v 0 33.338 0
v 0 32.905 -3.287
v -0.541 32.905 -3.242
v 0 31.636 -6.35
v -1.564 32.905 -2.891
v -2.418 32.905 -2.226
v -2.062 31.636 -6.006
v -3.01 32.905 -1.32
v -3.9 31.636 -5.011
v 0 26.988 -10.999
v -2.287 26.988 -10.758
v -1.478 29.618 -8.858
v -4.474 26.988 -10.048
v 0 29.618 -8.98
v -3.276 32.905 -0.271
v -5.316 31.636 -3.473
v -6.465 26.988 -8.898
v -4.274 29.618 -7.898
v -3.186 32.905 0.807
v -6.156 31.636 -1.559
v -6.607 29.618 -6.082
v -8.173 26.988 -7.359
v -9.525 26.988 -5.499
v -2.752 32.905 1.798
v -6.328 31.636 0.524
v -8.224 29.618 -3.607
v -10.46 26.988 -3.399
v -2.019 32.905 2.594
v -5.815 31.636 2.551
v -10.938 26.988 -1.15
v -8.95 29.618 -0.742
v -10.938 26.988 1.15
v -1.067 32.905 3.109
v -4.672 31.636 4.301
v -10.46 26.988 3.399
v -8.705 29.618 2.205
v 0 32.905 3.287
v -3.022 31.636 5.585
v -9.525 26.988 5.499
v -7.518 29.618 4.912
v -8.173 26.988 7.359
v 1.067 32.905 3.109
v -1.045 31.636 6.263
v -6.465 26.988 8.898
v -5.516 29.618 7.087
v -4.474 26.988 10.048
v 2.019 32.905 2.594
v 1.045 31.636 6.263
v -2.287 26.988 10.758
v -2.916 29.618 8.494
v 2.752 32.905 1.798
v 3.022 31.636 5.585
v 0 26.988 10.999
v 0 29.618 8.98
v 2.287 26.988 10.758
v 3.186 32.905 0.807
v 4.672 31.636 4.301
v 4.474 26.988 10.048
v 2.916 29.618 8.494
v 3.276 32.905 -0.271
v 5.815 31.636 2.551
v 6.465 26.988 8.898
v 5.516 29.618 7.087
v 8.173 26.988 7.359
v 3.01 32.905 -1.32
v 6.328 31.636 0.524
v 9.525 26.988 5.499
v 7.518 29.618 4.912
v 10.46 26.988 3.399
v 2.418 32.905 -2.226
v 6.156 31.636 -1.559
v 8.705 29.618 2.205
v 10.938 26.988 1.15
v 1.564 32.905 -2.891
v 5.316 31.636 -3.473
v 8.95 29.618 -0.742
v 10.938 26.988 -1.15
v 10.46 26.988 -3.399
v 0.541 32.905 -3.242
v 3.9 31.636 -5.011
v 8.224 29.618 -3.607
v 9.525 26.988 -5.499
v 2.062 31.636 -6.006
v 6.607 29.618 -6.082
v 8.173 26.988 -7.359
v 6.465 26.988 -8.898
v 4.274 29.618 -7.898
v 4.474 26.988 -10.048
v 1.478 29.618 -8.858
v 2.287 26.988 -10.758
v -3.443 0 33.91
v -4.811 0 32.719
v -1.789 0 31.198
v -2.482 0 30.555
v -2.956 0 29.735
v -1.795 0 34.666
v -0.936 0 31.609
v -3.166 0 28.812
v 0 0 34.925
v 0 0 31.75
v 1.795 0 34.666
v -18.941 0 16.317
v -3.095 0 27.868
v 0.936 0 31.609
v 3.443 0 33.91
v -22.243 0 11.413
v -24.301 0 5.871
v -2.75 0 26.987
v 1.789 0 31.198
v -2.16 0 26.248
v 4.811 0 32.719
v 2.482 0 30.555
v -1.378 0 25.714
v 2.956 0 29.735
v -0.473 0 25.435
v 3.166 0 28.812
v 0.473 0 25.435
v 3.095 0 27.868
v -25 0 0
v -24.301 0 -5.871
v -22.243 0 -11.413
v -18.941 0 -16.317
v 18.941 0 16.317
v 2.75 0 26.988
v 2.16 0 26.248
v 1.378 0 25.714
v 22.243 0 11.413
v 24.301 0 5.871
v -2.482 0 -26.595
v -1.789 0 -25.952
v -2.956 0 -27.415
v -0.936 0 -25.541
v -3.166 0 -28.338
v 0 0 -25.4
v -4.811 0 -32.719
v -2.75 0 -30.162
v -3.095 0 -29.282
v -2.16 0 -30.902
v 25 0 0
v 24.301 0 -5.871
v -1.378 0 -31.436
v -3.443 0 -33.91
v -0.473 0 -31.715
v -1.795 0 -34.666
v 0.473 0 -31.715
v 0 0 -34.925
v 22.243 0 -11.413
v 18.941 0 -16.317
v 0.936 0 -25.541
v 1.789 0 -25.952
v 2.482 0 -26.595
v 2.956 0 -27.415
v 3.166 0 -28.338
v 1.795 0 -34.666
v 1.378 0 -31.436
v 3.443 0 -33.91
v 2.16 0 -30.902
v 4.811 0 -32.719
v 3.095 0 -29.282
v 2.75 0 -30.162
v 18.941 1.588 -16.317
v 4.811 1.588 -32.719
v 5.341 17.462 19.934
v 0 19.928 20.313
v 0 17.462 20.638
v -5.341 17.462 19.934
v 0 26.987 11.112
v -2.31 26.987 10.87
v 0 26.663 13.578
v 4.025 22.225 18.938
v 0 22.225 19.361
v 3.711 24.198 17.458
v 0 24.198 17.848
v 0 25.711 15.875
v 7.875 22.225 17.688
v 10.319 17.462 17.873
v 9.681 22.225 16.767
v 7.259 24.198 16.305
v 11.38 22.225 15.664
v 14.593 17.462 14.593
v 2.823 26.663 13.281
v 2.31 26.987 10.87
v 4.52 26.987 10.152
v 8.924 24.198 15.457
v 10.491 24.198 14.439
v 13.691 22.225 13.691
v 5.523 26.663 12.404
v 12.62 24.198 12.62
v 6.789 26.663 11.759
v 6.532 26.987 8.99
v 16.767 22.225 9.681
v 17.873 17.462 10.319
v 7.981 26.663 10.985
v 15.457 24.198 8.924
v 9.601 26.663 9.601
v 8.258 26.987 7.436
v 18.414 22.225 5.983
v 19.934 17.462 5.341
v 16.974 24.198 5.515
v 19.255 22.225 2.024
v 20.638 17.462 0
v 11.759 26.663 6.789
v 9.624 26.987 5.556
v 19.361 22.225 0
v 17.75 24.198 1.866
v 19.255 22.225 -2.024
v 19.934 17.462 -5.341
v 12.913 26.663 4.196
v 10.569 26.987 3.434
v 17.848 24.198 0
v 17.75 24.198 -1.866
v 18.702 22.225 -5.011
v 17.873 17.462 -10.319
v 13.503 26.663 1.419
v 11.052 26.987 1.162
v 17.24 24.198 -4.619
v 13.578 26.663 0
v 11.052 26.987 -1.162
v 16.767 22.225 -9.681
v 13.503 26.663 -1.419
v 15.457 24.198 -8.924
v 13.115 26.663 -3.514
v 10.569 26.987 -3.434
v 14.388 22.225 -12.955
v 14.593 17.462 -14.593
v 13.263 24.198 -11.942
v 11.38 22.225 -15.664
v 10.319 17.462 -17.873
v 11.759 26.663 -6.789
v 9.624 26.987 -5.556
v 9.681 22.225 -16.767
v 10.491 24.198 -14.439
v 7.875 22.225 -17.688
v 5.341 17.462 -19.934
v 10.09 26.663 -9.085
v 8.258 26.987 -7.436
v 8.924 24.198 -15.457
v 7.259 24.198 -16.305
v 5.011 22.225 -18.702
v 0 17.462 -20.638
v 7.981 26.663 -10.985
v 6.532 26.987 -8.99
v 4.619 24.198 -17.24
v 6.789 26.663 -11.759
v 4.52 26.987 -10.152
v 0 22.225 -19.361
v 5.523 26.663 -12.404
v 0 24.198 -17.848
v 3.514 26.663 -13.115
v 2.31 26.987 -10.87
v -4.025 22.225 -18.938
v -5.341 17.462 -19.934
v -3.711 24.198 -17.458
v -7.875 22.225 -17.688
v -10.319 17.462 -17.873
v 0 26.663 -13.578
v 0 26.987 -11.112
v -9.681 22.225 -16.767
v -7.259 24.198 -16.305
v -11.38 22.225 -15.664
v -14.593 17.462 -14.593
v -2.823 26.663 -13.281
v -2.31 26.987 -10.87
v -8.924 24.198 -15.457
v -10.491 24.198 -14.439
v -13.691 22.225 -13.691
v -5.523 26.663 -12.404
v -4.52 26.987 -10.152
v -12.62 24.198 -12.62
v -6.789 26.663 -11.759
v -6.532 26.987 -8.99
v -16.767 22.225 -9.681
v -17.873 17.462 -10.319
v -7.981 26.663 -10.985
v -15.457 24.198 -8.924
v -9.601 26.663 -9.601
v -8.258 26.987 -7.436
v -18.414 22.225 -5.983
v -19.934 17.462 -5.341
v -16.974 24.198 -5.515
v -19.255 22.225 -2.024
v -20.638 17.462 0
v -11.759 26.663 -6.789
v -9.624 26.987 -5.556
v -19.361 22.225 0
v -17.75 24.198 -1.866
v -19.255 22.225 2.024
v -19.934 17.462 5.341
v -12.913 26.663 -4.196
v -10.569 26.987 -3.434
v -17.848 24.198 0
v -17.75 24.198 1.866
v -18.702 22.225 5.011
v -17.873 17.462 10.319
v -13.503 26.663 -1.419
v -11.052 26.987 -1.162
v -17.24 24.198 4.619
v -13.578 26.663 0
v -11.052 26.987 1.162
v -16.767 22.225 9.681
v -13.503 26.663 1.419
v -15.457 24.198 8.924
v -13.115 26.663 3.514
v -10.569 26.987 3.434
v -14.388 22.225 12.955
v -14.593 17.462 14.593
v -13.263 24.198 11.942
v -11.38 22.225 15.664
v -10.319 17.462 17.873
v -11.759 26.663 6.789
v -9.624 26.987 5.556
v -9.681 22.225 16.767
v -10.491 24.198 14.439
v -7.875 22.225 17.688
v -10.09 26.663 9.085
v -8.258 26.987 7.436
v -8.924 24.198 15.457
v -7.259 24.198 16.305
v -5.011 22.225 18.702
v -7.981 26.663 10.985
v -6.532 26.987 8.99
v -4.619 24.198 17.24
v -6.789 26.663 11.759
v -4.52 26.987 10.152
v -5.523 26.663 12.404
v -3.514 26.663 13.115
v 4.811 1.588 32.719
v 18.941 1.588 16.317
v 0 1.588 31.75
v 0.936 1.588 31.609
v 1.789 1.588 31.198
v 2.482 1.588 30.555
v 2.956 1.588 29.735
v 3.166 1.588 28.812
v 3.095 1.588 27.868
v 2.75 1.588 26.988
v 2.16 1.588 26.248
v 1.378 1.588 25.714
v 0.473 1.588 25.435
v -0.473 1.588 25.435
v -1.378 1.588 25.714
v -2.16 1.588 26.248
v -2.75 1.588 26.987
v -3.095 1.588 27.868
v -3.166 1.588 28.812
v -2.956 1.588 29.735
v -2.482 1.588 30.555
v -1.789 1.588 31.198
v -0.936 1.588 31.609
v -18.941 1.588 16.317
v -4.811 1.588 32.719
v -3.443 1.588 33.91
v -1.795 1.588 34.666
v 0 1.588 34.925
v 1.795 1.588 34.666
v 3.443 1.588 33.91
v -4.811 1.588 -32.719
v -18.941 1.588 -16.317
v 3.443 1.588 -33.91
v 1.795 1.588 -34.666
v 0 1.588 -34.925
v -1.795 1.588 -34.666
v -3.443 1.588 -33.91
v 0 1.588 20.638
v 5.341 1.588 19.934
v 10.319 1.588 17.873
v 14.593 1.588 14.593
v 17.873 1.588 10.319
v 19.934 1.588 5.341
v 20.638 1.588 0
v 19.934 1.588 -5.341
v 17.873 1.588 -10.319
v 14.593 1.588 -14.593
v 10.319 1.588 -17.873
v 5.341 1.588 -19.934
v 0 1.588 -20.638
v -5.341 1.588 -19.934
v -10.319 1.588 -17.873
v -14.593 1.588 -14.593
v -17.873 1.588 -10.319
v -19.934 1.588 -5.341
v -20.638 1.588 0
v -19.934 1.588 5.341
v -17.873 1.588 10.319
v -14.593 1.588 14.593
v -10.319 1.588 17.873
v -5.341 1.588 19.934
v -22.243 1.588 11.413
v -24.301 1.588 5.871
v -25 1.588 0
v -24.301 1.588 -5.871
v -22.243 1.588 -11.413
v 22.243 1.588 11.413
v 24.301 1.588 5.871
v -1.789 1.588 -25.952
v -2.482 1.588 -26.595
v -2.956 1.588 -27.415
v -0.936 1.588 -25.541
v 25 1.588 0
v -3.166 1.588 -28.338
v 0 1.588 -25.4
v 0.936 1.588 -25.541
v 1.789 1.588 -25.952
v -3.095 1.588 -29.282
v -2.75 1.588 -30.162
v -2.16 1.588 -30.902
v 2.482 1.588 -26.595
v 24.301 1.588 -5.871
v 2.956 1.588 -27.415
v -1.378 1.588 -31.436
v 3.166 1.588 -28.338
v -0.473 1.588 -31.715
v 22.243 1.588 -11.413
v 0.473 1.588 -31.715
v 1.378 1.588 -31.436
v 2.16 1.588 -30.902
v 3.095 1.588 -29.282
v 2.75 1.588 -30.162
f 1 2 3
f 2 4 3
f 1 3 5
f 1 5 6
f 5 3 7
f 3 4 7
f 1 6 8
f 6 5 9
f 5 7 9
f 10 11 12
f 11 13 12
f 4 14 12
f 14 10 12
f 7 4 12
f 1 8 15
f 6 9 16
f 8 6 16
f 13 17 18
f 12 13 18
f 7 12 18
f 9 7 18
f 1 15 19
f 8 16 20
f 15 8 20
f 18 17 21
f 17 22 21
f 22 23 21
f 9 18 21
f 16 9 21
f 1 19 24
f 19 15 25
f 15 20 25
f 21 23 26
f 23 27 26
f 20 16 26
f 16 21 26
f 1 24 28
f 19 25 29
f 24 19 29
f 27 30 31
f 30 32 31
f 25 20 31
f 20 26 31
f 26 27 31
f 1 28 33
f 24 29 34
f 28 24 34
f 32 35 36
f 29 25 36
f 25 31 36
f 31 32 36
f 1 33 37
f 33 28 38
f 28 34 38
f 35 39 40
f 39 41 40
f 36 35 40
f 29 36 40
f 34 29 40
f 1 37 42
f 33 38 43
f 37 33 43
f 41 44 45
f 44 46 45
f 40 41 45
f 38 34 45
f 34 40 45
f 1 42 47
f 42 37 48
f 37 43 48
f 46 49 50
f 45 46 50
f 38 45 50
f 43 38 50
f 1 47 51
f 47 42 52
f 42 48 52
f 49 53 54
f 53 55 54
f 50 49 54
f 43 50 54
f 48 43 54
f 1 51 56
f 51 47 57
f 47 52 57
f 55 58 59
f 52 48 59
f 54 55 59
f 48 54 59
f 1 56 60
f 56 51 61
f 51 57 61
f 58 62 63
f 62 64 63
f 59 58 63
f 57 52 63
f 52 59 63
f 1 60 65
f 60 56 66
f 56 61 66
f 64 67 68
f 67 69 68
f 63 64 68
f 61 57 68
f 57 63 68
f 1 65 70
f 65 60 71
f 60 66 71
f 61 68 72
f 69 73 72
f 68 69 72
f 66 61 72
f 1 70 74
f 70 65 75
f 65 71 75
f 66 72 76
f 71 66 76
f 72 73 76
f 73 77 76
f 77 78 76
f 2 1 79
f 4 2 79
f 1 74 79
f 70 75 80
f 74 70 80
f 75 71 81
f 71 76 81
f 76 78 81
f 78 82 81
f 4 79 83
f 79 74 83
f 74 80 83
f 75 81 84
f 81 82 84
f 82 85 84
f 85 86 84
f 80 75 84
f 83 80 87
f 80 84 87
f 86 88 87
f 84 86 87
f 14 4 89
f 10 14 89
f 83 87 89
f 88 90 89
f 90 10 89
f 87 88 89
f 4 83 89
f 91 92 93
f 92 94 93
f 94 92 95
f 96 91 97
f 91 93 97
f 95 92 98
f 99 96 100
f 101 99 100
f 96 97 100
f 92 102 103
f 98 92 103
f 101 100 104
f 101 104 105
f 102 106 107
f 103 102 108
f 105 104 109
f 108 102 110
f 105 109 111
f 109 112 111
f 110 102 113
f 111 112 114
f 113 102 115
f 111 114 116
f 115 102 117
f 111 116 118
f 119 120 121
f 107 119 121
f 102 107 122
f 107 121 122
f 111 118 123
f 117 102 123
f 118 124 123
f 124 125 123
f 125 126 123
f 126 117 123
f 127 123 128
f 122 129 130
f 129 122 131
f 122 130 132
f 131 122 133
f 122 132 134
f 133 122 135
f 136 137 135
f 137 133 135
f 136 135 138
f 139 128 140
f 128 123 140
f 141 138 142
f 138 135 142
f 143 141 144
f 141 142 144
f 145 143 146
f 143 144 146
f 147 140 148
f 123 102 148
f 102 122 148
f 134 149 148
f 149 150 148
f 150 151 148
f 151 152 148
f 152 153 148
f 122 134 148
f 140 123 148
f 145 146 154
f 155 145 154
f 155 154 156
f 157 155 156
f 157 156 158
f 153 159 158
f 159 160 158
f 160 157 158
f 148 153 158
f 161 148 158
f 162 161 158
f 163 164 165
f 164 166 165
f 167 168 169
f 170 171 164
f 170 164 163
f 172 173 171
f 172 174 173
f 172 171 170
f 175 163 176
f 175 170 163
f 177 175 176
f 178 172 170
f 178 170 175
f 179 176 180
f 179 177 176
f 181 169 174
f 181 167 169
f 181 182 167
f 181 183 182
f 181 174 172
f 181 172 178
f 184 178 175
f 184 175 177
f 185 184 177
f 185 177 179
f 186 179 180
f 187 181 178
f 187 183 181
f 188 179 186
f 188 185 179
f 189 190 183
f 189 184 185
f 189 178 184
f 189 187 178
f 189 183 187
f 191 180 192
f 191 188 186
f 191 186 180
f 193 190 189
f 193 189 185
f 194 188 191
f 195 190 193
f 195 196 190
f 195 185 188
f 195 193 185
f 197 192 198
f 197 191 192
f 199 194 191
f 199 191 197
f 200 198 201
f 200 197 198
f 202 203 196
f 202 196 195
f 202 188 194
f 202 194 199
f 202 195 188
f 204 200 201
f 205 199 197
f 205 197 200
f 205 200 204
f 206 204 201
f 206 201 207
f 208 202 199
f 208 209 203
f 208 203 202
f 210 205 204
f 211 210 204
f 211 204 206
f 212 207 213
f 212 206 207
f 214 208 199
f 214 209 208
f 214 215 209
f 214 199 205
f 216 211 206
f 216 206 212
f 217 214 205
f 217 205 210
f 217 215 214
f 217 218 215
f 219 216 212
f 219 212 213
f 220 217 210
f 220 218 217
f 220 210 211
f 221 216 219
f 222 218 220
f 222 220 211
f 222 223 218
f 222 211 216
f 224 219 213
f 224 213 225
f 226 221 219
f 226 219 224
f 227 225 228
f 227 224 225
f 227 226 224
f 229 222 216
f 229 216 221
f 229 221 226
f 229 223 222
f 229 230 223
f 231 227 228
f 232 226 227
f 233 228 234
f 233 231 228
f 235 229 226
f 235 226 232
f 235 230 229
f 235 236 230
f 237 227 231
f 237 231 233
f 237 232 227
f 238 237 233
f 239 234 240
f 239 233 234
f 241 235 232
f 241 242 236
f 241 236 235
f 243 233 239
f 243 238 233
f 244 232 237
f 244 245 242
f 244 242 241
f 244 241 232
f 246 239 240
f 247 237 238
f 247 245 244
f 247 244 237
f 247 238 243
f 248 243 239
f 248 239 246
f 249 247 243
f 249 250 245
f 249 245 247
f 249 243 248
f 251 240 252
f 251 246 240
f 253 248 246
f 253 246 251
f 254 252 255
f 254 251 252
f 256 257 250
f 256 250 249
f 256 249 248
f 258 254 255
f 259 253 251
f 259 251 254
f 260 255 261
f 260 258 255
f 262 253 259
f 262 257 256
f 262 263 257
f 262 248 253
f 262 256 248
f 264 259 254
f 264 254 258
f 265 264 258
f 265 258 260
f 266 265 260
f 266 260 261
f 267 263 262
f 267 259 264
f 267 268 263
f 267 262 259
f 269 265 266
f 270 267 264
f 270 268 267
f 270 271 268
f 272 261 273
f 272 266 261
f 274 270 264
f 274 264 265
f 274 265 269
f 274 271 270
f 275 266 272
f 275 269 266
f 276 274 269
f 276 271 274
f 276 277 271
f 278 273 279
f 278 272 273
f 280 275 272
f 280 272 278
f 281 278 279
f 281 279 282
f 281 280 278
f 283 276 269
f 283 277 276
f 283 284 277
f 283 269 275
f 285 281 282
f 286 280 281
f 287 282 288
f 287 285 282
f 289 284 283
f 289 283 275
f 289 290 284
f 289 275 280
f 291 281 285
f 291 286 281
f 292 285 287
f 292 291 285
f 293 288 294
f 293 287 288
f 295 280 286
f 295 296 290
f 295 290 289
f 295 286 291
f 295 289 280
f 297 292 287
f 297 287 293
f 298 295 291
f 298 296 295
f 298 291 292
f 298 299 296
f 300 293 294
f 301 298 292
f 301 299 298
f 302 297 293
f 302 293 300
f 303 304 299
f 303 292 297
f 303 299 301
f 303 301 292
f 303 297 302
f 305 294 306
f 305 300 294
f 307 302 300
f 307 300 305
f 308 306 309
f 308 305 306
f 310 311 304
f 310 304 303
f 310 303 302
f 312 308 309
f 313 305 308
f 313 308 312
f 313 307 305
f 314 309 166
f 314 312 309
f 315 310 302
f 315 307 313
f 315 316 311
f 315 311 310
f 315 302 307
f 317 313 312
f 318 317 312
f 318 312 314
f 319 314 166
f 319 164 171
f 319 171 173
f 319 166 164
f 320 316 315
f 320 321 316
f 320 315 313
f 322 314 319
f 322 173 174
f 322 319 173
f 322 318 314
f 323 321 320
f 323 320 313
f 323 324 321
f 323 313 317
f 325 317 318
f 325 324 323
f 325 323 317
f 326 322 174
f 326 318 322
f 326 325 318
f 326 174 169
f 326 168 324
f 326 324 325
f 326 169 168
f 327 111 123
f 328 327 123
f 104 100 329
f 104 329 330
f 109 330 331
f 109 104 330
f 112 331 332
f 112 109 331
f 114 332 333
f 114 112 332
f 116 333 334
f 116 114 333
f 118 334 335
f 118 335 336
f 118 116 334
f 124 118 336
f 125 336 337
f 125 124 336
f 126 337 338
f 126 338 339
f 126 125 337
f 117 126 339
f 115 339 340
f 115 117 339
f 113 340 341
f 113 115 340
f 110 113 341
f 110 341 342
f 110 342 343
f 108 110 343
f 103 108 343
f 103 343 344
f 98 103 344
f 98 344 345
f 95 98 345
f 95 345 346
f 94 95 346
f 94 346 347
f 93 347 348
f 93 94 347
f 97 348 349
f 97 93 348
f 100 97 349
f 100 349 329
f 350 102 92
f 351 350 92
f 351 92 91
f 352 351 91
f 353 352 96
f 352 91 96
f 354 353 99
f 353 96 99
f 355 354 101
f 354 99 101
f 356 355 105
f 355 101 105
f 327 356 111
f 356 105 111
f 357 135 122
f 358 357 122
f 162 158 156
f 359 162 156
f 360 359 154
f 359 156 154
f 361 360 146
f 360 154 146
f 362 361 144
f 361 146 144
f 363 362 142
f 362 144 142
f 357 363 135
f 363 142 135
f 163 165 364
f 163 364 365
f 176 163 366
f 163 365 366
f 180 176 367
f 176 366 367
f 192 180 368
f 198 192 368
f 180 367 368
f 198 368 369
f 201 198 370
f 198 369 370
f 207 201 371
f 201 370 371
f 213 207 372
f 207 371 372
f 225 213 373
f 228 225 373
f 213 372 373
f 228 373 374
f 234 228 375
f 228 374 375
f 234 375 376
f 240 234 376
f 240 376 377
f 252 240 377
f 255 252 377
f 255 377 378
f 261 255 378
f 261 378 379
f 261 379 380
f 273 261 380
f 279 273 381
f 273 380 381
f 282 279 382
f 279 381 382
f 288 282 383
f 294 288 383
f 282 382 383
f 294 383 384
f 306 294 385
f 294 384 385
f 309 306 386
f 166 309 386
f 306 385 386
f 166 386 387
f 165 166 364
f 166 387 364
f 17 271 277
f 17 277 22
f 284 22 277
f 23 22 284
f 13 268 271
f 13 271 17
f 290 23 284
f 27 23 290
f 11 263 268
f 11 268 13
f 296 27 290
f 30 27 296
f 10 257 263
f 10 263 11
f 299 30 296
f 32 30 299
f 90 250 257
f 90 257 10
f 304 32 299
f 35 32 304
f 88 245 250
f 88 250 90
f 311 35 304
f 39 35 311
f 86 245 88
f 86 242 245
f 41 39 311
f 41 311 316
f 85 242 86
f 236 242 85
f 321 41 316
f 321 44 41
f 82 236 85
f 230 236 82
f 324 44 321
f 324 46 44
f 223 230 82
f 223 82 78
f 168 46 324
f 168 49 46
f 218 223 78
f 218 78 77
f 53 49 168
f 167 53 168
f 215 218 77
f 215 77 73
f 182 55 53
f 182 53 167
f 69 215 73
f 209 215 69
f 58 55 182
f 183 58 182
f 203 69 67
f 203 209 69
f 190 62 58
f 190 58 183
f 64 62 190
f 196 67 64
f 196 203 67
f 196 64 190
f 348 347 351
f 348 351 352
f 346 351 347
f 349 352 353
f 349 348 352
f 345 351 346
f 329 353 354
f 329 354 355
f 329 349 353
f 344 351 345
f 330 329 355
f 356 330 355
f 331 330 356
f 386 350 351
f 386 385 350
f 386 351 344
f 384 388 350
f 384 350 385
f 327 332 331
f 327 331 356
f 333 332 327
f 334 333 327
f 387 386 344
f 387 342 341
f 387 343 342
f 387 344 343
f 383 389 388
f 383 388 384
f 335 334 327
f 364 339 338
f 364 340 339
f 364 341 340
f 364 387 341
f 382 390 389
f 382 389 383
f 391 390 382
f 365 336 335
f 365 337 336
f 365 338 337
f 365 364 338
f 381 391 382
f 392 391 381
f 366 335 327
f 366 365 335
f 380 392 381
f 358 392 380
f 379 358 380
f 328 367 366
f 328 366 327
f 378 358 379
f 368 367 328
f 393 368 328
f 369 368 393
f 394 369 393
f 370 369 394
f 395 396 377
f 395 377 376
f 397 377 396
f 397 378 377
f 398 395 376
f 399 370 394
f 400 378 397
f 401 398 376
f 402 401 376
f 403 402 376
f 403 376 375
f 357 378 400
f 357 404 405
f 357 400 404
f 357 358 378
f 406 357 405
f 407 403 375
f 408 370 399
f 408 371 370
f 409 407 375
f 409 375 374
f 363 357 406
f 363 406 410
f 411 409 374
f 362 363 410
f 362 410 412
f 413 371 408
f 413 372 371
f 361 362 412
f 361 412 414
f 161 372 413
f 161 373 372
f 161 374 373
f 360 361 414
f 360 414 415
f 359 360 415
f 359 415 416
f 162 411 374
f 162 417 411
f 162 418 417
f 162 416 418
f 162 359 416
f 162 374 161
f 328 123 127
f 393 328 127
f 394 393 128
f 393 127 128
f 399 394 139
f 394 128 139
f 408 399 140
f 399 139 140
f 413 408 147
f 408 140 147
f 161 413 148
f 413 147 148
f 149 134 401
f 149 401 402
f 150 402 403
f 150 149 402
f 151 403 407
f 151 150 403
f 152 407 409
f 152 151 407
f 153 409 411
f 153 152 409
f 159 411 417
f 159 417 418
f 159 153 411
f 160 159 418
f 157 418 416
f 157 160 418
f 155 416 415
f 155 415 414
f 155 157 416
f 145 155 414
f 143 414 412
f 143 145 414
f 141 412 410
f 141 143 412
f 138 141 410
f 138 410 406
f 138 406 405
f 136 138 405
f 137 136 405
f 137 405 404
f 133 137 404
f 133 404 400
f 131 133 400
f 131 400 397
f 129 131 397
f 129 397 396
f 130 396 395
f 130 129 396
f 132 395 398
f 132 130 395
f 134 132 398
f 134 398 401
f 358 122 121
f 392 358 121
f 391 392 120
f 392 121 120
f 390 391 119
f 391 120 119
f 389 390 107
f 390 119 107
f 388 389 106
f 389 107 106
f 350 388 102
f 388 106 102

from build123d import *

# Parameters (mm, degrees)
SKETCH1_R           = 3.175
BOSS_EXTRUDE1_DEPTH = 1.5875
SKETCH2_R           = 20.6375
BOSS_EXTRUDE2_DEPTH = 25.4
FILLET1_R           = 9.525


with BuildPart() as part:
    # Sketch1 → Boss-Extrude1 (new body)
    with BuildSketch(Plane(origin=(0, 0, 0), x_dir=(1, 0, 0), z_dir=(0, 1, 0))):
        with BuildLine():
            ThreePointArc((-18.941091873, 16.316710411), (-25, 0), (-18.941091873, -16.316710411))
            Line((-18.941091873, -16.316710411), (-4.811037336, -32.719444444))
            ThreePointArc((-4.811037336, -32.719444444), (0, -34.925), (4.811037336, -32.719444444))
            Line((4.811037336, -32.719444444), (18.941091873, -16.316710411))
            ThreePointArc((18.941091873, -16.316710411), (25, 0), (18.941091873, 16.316710411))
            Line((18.941091873, 16.316710411), (4.811037336, 32.719444444))
            ThreePointArc((4.811037336, 32.719444444), (0, 34.925), (-4.811037336, 32.719444444))
            Line((-4.811037336, 32.719444444), (-18.941091873, 16.316710411))
        make_face()
        with Locations(Location((0, -28.575, 0), (0, 0, 270))):
            Circle(SKETCH1_R, mode=Mode.SUBTRACT)
        with Locations(Location((0, 28.575, 0), (0, 0, 270))):
            Circle(SKETCH1_R, mode=Mode.SUBTRACT)
    extrude(amount=BOSS_EXTRUDE1_DEPTH)

    # Sketch2 → Boss-Extrude2 (add)
    with BuildSketch(Plane(origin=(0, 1.5875, 0), x_dir=(1, 0, 0), z_dir=(0, 1, 0))):
        with Locations(Location((0, 0, 0), (0, 0, 270))):
            Circle(SKETCH2_R)
    extrude(amount=BOSS_EXTRUDE2_DEPTH)

    # Fillet1
    fillet1_edges = [part.edges().sort_by_distance(p)[0] for p in [
        (0, 26.9875, -20.6375),
    ]]
    fillet(fillet1_edges, radius=FILLET1_R)

    # Sketch4 → Revolve1 (revolve)
    with BuildSketch(Plane(origin=(0, 0, 0), x_dir=(0, 0, -1), z_dir=(1, 0, 0))):
        with BuildLine():
            Line((10.998522628, 26.9875), (0, 26.9875))
            Line((0, 26.9875), (0, 33.3375))
            ThreePointArc((0, 33.3375), (6.35, 31.636022628), (10.998522628, 26.9875))
        make_face()
    revolve(axis=Axis((0, 26.9875, 0), (0, 1, 0)))


solid = part.part
